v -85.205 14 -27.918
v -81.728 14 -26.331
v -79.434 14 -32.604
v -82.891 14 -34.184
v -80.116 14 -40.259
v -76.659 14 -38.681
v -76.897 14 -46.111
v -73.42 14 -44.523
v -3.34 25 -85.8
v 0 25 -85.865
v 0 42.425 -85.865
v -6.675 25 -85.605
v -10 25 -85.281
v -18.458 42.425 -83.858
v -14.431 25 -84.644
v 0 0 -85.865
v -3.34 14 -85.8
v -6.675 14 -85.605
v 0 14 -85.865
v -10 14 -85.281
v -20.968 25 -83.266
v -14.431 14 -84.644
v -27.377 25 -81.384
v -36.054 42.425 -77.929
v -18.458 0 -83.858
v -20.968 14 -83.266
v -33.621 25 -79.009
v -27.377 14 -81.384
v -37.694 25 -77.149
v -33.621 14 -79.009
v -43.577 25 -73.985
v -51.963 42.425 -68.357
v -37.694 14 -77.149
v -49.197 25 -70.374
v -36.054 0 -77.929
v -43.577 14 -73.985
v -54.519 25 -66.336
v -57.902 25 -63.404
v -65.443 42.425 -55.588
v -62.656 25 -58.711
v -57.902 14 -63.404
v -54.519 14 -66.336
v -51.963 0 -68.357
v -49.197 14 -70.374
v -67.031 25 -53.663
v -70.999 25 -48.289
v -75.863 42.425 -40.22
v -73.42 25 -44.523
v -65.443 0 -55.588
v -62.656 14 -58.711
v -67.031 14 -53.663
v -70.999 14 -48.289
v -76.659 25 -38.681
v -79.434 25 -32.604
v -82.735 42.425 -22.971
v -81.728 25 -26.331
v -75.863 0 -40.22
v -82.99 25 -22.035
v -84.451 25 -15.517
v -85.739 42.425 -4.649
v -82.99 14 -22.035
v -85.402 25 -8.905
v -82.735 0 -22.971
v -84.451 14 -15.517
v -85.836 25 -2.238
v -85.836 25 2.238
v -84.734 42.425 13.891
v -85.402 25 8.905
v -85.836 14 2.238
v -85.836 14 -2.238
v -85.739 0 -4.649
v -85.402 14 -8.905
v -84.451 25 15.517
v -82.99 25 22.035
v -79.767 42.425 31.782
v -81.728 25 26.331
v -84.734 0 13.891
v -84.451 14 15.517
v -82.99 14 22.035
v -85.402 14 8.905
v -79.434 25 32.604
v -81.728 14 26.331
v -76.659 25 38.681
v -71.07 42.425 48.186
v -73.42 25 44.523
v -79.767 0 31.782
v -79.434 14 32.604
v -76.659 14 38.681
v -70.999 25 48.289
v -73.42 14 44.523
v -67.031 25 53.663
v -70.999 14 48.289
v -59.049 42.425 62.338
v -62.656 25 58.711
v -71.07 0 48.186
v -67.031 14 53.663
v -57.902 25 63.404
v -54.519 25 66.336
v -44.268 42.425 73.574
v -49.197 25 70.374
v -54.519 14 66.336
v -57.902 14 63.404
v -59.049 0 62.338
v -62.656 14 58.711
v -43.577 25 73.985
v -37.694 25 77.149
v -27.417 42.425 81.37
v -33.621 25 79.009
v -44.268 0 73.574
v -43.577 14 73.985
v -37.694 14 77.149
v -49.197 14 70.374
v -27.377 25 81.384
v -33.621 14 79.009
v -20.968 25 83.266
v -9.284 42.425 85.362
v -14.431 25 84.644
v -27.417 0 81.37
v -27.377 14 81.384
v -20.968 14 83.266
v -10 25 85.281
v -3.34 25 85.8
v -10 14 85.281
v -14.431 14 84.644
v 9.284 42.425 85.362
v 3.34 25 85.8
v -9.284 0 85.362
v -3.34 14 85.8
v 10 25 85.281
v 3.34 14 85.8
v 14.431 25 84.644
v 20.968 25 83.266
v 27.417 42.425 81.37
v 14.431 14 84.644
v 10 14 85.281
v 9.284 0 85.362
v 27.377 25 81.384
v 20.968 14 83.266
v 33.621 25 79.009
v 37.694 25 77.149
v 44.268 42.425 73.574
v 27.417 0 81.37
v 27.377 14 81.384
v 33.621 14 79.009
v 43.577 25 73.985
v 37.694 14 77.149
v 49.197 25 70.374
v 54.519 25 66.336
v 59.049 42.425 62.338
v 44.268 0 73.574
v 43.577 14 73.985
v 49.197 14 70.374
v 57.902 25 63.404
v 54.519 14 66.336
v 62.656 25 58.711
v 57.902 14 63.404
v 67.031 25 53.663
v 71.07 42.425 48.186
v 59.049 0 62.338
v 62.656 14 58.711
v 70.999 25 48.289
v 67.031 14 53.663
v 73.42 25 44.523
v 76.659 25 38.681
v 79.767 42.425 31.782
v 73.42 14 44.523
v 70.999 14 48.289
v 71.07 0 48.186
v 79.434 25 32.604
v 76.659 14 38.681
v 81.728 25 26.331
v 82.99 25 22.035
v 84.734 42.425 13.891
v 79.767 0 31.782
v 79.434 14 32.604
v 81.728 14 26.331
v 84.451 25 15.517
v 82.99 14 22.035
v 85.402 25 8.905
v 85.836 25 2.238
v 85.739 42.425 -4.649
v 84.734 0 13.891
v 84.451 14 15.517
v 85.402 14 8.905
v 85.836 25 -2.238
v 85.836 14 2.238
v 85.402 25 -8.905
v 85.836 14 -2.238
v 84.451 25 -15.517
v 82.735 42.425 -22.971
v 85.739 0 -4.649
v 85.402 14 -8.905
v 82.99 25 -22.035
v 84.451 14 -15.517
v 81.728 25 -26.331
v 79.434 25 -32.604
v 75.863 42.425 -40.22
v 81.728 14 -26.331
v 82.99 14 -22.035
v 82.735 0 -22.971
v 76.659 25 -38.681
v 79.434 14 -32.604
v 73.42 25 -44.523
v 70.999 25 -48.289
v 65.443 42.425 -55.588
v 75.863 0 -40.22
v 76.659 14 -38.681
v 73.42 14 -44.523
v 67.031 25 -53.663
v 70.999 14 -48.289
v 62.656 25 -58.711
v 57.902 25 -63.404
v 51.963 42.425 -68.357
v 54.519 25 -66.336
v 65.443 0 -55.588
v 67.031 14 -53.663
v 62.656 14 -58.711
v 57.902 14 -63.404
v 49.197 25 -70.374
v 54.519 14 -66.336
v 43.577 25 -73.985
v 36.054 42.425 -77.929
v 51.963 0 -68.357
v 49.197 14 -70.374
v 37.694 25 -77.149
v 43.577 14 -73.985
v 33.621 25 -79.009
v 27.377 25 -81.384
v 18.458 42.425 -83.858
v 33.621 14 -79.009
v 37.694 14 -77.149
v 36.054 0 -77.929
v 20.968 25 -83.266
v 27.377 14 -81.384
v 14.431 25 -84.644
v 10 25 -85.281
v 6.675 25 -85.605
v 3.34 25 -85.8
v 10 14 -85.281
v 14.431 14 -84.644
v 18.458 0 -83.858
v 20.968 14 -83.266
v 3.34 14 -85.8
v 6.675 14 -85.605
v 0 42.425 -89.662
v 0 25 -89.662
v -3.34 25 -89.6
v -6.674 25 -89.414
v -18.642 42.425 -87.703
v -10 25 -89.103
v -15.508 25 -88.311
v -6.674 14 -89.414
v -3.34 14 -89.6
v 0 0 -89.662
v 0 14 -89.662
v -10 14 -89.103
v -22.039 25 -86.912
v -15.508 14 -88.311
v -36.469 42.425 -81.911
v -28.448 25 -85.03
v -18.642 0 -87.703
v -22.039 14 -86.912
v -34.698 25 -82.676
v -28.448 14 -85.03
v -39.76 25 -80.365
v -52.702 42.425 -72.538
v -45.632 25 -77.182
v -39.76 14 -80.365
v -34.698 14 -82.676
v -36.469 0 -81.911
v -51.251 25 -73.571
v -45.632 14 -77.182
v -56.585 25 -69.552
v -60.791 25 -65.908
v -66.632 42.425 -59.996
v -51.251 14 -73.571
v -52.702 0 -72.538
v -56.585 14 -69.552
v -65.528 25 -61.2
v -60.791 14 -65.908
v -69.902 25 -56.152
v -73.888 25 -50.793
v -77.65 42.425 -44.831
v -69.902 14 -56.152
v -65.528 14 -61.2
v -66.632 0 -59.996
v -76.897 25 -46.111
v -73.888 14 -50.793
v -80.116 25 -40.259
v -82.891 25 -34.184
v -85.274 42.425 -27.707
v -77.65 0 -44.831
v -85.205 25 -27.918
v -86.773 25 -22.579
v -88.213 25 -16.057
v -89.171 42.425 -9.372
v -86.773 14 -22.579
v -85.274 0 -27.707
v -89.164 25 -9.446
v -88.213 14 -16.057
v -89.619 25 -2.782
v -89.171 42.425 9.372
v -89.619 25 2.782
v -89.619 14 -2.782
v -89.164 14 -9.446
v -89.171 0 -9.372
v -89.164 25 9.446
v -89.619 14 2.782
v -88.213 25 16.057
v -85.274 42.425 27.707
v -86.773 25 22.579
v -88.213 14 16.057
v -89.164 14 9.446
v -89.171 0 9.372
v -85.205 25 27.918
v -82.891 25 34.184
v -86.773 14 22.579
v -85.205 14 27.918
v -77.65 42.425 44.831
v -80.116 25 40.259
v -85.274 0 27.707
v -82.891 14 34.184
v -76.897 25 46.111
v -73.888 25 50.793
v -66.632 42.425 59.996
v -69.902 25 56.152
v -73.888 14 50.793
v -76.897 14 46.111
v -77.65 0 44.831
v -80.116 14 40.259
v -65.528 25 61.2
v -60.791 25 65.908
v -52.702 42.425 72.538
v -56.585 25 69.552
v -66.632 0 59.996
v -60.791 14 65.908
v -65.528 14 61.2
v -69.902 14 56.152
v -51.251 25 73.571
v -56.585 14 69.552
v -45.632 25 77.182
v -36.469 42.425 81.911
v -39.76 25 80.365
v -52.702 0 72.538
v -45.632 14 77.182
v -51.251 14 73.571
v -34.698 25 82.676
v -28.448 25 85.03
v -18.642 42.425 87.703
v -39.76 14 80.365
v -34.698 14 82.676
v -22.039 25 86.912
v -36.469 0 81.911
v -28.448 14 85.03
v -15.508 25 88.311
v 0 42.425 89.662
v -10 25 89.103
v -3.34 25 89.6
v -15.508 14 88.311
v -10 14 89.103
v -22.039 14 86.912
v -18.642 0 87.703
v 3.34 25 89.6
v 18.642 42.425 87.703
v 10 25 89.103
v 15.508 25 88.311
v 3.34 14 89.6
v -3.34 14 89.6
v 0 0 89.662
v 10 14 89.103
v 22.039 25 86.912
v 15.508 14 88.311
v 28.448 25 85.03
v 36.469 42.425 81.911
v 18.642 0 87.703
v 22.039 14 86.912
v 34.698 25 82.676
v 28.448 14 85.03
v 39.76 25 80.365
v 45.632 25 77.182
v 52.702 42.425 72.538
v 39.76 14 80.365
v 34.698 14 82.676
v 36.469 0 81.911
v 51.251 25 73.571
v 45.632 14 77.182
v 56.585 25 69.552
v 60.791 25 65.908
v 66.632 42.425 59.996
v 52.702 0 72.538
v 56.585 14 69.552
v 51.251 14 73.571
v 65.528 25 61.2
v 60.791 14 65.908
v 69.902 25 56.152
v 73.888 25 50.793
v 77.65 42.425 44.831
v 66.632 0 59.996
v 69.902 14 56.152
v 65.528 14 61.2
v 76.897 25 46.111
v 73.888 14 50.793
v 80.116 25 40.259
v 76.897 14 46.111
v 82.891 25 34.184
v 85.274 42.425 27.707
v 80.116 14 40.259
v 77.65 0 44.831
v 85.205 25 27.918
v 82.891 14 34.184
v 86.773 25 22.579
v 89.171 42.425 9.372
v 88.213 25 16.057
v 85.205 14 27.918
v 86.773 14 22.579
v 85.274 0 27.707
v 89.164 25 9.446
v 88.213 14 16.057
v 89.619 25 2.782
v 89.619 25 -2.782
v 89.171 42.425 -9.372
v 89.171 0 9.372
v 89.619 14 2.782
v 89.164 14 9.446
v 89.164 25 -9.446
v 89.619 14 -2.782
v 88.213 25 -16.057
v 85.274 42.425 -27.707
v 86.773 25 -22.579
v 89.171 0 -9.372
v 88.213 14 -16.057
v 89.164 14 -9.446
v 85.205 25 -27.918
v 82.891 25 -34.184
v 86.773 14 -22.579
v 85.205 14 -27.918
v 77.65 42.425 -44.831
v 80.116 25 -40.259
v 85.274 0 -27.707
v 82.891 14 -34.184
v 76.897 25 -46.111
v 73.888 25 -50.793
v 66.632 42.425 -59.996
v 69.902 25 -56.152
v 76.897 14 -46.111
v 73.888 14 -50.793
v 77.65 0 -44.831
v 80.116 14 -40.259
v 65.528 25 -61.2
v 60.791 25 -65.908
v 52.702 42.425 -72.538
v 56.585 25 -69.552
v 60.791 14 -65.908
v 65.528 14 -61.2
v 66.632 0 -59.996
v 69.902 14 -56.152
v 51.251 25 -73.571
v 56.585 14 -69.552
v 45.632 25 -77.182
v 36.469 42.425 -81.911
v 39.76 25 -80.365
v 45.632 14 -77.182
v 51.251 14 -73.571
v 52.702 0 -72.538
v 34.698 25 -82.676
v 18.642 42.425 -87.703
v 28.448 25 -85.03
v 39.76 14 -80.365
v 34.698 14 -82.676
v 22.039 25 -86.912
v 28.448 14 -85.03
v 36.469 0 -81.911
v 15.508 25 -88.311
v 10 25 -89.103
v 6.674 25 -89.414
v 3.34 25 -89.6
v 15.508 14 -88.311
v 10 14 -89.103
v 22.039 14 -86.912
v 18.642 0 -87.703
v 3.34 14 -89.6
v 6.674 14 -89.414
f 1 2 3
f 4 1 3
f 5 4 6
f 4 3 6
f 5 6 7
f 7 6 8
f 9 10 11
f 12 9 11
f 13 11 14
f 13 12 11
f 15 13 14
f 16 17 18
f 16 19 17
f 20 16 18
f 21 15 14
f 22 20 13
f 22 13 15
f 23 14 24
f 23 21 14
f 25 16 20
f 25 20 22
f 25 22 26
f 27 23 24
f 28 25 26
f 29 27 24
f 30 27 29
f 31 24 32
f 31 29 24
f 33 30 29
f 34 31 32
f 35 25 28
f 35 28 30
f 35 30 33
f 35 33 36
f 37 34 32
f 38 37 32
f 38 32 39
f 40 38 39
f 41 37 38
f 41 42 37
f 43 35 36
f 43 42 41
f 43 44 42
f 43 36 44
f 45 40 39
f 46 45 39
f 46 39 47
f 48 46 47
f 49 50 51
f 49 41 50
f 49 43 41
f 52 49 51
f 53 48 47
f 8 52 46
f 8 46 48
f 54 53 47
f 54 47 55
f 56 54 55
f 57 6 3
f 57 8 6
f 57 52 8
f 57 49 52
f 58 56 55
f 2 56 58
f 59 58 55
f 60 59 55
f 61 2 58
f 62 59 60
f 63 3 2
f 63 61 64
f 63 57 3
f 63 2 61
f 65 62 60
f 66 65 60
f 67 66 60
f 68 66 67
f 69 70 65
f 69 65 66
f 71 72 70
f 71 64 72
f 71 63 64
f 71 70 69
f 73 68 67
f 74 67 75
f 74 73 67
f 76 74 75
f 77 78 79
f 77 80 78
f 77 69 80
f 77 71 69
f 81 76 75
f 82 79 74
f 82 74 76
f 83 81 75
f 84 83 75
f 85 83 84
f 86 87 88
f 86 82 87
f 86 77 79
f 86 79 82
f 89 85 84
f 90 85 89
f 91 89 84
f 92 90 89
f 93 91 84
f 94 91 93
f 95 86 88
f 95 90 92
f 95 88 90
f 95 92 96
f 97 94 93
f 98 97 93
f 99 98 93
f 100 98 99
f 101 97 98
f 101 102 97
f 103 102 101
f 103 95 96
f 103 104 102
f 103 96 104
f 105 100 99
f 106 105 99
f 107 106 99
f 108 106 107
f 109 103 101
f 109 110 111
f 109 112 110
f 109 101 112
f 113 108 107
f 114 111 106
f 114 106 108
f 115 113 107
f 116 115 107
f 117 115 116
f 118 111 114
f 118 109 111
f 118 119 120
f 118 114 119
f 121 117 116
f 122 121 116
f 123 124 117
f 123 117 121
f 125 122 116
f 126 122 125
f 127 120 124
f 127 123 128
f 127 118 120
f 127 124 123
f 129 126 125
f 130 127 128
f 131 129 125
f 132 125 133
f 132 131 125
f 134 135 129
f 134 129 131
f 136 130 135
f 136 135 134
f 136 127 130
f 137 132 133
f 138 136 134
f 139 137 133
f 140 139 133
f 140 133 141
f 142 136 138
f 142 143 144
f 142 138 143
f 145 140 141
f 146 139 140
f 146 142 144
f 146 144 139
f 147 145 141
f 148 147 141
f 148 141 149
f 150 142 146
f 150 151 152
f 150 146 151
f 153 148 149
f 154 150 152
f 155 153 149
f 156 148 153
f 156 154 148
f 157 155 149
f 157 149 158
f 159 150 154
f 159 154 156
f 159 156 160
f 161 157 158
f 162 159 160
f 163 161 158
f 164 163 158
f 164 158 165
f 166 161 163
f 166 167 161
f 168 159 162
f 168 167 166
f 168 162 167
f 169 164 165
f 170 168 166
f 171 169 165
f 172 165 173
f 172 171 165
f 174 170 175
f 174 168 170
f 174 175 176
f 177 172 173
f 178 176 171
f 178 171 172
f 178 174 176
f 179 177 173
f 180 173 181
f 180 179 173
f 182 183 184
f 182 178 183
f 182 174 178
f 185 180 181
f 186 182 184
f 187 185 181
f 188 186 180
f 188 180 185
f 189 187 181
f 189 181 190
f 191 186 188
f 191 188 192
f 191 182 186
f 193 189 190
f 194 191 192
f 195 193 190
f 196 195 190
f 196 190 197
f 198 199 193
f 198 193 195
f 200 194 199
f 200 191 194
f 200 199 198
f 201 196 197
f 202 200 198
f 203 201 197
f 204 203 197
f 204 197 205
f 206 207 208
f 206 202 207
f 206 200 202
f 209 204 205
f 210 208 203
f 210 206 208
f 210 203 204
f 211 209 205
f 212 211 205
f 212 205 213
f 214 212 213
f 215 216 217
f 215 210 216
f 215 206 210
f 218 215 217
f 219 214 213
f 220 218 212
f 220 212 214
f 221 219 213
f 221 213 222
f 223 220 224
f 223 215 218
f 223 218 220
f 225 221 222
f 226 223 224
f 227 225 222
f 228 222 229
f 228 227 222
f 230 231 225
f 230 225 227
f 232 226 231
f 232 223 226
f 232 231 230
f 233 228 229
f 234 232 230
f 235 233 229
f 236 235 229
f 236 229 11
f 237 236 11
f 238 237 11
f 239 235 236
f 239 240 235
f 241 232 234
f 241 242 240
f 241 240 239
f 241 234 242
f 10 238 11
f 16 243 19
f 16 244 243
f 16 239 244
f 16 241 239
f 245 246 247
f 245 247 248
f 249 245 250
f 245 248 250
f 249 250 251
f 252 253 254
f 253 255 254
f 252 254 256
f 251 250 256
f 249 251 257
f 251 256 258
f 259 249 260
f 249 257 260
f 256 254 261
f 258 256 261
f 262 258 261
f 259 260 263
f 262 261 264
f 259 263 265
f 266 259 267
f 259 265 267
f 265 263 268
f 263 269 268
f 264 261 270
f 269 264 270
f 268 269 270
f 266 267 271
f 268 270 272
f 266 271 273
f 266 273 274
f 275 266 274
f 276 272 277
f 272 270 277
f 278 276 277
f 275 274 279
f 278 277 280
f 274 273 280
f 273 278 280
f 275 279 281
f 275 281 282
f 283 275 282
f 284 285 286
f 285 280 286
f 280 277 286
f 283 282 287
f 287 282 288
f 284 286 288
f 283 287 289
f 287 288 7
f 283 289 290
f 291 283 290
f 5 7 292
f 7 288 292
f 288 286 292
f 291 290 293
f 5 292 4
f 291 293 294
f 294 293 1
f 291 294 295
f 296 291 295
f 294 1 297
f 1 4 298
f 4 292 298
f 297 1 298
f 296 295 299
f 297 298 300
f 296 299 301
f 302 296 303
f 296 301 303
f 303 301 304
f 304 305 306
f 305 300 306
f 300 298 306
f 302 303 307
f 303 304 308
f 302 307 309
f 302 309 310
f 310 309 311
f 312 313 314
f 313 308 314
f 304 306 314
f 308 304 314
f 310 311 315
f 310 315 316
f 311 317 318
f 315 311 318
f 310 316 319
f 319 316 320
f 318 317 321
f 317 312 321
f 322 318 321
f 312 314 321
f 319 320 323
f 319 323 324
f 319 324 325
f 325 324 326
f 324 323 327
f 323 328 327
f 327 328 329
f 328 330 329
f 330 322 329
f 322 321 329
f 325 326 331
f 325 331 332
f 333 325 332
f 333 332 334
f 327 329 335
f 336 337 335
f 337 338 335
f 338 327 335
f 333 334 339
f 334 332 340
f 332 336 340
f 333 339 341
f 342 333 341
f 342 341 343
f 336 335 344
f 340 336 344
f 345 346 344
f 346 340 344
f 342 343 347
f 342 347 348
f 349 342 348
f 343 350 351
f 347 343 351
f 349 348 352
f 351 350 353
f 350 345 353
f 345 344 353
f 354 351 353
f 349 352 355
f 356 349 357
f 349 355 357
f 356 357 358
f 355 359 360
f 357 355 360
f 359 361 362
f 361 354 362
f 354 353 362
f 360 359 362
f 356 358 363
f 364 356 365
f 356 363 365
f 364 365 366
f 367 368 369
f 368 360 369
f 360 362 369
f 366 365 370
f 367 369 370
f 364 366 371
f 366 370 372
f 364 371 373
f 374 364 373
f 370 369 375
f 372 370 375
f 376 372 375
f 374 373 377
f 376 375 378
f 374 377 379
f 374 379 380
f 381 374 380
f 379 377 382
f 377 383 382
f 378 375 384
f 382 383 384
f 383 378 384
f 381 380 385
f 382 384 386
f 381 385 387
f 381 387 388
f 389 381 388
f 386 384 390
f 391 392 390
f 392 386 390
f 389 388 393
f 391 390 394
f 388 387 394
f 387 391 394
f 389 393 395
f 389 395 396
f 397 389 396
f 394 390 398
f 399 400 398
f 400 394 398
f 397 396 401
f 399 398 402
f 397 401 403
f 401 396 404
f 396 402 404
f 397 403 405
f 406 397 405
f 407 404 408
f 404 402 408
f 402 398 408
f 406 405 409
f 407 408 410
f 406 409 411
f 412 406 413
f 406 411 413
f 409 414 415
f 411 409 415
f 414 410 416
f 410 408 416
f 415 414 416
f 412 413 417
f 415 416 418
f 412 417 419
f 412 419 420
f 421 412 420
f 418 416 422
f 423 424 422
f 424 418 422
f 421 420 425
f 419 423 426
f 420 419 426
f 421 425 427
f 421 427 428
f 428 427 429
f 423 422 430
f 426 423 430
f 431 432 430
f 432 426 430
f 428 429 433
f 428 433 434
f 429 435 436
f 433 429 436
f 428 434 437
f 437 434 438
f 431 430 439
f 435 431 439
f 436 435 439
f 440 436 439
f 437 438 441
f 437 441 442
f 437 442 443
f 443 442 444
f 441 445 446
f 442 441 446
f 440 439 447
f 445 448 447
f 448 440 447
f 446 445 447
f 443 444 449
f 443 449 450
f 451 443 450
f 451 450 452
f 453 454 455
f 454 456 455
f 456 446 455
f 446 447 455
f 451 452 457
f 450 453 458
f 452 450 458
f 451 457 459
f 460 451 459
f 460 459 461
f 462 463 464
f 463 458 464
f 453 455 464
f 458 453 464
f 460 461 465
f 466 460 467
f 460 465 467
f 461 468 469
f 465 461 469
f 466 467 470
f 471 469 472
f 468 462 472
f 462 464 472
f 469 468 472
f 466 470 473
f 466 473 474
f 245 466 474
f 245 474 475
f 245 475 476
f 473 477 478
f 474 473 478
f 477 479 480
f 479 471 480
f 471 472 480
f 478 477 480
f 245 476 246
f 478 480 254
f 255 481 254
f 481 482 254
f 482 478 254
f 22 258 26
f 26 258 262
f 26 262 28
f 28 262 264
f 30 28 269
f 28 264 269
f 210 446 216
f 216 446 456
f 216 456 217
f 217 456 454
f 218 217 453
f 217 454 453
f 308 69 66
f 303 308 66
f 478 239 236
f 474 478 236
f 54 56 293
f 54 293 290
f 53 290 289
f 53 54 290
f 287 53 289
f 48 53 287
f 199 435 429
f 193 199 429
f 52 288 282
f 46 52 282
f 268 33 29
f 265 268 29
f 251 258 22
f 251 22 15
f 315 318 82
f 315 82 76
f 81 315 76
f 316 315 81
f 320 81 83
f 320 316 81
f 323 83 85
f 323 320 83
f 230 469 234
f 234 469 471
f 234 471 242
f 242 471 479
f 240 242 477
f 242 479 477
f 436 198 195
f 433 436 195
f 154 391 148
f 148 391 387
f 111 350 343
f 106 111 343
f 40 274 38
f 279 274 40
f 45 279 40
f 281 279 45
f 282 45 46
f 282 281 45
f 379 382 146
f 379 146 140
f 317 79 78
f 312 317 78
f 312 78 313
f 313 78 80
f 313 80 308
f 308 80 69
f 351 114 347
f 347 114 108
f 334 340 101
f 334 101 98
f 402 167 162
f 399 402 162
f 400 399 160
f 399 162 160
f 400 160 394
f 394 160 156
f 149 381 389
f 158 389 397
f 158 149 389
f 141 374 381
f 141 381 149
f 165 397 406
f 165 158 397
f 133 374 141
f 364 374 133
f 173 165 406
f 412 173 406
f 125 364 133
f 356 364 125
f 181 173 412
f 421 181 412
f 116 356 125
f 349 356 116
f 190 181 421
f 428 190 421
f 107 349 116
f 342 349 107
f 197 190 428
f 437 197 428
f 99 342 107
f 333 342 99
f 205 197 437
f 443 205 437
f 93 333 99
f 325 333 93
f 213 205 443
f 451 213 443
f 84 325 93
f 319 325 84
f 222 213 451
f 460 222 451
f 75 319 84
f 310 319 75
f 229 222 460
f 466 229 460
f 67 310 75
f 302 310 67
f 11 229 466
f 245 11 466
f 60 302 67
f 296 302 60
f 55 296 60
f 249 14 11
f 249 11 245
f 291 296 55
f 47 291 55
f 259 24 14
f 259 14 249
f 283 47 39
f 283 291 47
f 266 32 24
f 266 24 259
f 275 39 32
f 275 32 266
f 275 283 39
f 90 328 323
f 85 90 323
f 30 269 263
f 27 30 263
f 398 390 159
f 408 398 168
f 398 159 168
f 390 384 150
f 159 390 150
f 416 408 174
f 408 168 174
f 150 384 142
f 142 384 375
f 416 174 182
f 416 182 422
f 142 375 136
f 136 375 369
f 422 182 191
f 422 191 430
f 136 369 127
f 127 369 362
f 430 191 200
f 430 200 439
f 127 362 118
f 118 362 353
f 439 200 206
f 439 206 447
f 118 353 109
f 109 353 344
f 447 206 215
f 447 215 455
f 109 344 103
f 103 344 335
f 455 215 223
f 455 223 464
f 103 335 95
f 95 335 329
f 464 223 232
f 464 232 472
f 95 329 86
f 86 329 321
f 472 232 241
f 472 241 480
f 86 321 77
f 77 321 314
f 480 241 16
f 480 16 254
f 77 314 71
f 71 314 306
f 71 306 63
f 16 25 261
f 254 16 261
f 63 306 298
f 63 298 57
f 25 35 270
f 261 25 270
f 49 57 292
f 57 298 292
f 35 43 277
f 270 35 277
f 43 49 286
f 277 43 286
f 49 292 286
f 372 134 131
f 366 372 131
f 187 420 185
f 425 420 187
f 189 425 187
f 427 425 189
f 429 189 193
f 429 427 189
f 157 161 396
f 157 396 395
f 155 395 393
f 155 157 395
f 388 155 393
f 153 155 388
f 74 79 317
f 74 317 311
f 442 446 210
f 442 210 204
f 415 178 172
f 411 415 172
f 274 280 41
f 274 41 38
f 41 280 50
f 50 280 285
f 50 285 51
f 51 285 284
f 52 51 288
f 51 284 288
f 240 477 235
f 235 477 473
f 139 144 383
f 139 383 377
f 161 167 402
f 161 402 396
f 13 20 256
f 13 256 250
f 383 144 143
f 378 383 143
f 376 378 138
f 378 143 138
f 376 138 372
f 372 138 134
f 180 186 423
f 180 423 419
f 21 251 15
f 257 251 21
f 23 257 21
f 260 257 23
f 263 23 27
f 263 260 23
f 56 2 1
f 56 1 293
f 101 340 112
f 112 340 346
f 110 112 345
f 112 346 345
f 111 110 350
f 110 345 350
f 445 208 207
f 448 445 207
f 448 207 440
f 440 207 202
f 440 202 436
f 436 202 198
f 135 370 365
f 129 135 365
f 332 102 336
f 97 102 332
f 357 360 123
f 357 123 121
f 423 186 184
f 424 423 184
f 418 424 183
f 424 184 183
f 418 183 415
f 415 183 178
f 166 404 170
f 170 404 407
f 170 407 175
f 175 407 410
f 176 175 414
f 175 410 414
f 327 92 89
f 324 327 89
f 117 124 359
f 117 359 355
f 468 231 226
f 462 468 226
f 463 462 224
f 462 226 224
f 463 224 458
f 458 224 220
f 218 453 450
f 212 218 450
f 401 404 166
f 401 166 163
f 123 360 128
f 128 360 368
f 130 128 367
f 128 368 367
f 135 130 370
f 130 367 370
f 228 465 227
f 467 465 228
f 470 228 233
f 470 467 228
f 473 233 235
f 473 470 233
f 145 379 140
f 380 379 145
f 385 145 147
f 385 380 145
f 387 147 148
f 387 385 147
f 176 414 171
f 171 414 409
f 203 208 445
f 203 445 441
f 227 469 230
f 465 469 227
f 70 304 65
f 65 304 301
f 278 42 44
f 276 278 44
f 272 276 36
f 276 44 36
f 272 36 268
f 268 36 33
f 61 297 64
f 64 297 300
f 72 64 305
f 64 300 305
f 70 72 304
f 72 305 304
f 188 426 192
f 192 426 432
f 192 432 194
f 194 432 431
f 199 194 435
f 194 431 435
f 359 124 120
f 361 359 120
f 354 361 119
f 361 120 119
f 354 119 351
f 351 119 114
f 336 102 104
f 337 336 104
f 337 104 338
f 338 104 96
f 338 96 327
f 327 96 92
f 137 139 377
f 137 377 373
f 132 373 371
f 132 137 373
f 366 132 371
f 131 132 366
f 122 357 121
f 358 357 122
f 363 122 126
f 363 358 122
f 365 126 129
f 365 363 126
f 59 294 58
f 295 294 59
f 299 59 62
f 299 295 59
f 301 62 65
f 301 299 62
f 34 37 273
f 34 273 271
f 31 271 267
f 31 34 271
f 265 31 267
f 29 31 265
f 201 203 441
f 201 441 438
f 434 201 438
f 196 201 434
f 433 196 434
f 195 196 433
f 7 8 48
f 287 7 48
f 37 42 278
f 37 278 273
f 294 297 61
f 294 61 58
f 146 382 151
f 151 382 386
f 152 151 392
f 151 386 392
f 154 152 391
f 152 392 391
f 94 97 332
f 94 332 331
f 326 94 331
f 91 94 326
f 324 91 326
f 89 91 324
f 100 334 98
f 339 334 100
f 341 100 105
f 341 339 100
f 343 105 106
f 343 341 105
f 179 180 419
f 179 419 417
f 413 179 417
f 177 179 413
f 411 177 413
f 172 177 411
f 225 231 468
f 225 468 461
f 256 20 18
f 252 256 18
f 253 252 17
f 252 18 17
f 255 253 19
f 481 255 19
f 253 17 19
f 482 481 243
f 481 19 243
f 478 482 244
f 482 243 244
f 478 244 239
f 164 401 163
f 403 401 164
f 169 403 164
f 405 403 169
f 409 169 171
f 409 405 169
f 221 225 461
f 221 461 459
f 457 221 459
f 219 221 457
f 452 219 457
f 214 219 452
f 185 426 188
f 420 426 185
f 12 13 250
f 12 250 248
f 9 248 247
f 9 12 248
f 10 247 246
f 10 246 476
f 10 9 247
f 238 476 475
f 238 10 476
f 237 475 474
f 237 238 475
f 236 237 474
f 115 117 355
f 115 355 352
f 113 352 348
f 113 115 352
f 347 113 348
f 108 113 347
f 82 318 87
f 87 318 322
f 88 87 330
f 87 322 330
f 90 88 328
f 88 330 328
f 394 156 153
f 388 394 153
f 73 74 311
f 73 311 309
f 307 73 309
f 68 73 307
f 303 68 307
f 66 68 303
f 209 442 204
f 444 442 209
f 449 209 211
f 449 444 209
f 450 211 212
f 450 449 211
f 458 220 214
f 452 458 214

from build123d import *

# Parameters (mm, degrees)
SKETCH1_R           = 89.6625
SKETCH1_R_2         = 85.865
BOSS_EXTRUDE1_DEPTH = 42.425
SKETCH2_W           = 20
SKETCH2_H           = 11
CUT_EXTRUDE1_DEPTH  = 134.710913681
CIRPATTERN1_COUNT   = 11


with BuildPart() as part:
    # Sketch1 → Boss-Extrude1 (new body)
    with BuildSketch(Plane(origin=(0, 0, 0), x_dir=(1, 0, 0), z_dir=(0, 1, 0))):
        with Locations(Location((0, 0, 0), (0, 0, 90))):
            Circle(SKETCH1_R)
        with Locations(Location((0, 0, 0), (0, 0, 90))):
            Circle(SKETCH1_R_2, mode=Mode.SUBTRACT)
    extrude(amount=BOSS_EXTRUDE1_DEPTH)

    # Sketch2 → Cut-Extrude1 (cut, symmetric)
    with BuildSketch(Plane.XY):
        with Locations((0, 19.5)):
            Rectangle(SKETCH2_W, SKETCH2_H)
    cut_extrude1 = extrude(amount=CUT_EXTRUDE1_DEPTH, both=True, mode=Mode.SUBTRACT)

    # CirPattern1: Cut-Extrude1 ×11 about axis
    cirpattern1_axis = Axis((0, 0, 0), (0, 1, 0))
    for i in range(1, CIRPATTERN1_COUNT):
        add(cut_extrude1.rotate(cirpattern1_axis, i * 360 / CIRPATTERN1_COUNT), mode=Mode.SUBTRACT)


solid = part.part
